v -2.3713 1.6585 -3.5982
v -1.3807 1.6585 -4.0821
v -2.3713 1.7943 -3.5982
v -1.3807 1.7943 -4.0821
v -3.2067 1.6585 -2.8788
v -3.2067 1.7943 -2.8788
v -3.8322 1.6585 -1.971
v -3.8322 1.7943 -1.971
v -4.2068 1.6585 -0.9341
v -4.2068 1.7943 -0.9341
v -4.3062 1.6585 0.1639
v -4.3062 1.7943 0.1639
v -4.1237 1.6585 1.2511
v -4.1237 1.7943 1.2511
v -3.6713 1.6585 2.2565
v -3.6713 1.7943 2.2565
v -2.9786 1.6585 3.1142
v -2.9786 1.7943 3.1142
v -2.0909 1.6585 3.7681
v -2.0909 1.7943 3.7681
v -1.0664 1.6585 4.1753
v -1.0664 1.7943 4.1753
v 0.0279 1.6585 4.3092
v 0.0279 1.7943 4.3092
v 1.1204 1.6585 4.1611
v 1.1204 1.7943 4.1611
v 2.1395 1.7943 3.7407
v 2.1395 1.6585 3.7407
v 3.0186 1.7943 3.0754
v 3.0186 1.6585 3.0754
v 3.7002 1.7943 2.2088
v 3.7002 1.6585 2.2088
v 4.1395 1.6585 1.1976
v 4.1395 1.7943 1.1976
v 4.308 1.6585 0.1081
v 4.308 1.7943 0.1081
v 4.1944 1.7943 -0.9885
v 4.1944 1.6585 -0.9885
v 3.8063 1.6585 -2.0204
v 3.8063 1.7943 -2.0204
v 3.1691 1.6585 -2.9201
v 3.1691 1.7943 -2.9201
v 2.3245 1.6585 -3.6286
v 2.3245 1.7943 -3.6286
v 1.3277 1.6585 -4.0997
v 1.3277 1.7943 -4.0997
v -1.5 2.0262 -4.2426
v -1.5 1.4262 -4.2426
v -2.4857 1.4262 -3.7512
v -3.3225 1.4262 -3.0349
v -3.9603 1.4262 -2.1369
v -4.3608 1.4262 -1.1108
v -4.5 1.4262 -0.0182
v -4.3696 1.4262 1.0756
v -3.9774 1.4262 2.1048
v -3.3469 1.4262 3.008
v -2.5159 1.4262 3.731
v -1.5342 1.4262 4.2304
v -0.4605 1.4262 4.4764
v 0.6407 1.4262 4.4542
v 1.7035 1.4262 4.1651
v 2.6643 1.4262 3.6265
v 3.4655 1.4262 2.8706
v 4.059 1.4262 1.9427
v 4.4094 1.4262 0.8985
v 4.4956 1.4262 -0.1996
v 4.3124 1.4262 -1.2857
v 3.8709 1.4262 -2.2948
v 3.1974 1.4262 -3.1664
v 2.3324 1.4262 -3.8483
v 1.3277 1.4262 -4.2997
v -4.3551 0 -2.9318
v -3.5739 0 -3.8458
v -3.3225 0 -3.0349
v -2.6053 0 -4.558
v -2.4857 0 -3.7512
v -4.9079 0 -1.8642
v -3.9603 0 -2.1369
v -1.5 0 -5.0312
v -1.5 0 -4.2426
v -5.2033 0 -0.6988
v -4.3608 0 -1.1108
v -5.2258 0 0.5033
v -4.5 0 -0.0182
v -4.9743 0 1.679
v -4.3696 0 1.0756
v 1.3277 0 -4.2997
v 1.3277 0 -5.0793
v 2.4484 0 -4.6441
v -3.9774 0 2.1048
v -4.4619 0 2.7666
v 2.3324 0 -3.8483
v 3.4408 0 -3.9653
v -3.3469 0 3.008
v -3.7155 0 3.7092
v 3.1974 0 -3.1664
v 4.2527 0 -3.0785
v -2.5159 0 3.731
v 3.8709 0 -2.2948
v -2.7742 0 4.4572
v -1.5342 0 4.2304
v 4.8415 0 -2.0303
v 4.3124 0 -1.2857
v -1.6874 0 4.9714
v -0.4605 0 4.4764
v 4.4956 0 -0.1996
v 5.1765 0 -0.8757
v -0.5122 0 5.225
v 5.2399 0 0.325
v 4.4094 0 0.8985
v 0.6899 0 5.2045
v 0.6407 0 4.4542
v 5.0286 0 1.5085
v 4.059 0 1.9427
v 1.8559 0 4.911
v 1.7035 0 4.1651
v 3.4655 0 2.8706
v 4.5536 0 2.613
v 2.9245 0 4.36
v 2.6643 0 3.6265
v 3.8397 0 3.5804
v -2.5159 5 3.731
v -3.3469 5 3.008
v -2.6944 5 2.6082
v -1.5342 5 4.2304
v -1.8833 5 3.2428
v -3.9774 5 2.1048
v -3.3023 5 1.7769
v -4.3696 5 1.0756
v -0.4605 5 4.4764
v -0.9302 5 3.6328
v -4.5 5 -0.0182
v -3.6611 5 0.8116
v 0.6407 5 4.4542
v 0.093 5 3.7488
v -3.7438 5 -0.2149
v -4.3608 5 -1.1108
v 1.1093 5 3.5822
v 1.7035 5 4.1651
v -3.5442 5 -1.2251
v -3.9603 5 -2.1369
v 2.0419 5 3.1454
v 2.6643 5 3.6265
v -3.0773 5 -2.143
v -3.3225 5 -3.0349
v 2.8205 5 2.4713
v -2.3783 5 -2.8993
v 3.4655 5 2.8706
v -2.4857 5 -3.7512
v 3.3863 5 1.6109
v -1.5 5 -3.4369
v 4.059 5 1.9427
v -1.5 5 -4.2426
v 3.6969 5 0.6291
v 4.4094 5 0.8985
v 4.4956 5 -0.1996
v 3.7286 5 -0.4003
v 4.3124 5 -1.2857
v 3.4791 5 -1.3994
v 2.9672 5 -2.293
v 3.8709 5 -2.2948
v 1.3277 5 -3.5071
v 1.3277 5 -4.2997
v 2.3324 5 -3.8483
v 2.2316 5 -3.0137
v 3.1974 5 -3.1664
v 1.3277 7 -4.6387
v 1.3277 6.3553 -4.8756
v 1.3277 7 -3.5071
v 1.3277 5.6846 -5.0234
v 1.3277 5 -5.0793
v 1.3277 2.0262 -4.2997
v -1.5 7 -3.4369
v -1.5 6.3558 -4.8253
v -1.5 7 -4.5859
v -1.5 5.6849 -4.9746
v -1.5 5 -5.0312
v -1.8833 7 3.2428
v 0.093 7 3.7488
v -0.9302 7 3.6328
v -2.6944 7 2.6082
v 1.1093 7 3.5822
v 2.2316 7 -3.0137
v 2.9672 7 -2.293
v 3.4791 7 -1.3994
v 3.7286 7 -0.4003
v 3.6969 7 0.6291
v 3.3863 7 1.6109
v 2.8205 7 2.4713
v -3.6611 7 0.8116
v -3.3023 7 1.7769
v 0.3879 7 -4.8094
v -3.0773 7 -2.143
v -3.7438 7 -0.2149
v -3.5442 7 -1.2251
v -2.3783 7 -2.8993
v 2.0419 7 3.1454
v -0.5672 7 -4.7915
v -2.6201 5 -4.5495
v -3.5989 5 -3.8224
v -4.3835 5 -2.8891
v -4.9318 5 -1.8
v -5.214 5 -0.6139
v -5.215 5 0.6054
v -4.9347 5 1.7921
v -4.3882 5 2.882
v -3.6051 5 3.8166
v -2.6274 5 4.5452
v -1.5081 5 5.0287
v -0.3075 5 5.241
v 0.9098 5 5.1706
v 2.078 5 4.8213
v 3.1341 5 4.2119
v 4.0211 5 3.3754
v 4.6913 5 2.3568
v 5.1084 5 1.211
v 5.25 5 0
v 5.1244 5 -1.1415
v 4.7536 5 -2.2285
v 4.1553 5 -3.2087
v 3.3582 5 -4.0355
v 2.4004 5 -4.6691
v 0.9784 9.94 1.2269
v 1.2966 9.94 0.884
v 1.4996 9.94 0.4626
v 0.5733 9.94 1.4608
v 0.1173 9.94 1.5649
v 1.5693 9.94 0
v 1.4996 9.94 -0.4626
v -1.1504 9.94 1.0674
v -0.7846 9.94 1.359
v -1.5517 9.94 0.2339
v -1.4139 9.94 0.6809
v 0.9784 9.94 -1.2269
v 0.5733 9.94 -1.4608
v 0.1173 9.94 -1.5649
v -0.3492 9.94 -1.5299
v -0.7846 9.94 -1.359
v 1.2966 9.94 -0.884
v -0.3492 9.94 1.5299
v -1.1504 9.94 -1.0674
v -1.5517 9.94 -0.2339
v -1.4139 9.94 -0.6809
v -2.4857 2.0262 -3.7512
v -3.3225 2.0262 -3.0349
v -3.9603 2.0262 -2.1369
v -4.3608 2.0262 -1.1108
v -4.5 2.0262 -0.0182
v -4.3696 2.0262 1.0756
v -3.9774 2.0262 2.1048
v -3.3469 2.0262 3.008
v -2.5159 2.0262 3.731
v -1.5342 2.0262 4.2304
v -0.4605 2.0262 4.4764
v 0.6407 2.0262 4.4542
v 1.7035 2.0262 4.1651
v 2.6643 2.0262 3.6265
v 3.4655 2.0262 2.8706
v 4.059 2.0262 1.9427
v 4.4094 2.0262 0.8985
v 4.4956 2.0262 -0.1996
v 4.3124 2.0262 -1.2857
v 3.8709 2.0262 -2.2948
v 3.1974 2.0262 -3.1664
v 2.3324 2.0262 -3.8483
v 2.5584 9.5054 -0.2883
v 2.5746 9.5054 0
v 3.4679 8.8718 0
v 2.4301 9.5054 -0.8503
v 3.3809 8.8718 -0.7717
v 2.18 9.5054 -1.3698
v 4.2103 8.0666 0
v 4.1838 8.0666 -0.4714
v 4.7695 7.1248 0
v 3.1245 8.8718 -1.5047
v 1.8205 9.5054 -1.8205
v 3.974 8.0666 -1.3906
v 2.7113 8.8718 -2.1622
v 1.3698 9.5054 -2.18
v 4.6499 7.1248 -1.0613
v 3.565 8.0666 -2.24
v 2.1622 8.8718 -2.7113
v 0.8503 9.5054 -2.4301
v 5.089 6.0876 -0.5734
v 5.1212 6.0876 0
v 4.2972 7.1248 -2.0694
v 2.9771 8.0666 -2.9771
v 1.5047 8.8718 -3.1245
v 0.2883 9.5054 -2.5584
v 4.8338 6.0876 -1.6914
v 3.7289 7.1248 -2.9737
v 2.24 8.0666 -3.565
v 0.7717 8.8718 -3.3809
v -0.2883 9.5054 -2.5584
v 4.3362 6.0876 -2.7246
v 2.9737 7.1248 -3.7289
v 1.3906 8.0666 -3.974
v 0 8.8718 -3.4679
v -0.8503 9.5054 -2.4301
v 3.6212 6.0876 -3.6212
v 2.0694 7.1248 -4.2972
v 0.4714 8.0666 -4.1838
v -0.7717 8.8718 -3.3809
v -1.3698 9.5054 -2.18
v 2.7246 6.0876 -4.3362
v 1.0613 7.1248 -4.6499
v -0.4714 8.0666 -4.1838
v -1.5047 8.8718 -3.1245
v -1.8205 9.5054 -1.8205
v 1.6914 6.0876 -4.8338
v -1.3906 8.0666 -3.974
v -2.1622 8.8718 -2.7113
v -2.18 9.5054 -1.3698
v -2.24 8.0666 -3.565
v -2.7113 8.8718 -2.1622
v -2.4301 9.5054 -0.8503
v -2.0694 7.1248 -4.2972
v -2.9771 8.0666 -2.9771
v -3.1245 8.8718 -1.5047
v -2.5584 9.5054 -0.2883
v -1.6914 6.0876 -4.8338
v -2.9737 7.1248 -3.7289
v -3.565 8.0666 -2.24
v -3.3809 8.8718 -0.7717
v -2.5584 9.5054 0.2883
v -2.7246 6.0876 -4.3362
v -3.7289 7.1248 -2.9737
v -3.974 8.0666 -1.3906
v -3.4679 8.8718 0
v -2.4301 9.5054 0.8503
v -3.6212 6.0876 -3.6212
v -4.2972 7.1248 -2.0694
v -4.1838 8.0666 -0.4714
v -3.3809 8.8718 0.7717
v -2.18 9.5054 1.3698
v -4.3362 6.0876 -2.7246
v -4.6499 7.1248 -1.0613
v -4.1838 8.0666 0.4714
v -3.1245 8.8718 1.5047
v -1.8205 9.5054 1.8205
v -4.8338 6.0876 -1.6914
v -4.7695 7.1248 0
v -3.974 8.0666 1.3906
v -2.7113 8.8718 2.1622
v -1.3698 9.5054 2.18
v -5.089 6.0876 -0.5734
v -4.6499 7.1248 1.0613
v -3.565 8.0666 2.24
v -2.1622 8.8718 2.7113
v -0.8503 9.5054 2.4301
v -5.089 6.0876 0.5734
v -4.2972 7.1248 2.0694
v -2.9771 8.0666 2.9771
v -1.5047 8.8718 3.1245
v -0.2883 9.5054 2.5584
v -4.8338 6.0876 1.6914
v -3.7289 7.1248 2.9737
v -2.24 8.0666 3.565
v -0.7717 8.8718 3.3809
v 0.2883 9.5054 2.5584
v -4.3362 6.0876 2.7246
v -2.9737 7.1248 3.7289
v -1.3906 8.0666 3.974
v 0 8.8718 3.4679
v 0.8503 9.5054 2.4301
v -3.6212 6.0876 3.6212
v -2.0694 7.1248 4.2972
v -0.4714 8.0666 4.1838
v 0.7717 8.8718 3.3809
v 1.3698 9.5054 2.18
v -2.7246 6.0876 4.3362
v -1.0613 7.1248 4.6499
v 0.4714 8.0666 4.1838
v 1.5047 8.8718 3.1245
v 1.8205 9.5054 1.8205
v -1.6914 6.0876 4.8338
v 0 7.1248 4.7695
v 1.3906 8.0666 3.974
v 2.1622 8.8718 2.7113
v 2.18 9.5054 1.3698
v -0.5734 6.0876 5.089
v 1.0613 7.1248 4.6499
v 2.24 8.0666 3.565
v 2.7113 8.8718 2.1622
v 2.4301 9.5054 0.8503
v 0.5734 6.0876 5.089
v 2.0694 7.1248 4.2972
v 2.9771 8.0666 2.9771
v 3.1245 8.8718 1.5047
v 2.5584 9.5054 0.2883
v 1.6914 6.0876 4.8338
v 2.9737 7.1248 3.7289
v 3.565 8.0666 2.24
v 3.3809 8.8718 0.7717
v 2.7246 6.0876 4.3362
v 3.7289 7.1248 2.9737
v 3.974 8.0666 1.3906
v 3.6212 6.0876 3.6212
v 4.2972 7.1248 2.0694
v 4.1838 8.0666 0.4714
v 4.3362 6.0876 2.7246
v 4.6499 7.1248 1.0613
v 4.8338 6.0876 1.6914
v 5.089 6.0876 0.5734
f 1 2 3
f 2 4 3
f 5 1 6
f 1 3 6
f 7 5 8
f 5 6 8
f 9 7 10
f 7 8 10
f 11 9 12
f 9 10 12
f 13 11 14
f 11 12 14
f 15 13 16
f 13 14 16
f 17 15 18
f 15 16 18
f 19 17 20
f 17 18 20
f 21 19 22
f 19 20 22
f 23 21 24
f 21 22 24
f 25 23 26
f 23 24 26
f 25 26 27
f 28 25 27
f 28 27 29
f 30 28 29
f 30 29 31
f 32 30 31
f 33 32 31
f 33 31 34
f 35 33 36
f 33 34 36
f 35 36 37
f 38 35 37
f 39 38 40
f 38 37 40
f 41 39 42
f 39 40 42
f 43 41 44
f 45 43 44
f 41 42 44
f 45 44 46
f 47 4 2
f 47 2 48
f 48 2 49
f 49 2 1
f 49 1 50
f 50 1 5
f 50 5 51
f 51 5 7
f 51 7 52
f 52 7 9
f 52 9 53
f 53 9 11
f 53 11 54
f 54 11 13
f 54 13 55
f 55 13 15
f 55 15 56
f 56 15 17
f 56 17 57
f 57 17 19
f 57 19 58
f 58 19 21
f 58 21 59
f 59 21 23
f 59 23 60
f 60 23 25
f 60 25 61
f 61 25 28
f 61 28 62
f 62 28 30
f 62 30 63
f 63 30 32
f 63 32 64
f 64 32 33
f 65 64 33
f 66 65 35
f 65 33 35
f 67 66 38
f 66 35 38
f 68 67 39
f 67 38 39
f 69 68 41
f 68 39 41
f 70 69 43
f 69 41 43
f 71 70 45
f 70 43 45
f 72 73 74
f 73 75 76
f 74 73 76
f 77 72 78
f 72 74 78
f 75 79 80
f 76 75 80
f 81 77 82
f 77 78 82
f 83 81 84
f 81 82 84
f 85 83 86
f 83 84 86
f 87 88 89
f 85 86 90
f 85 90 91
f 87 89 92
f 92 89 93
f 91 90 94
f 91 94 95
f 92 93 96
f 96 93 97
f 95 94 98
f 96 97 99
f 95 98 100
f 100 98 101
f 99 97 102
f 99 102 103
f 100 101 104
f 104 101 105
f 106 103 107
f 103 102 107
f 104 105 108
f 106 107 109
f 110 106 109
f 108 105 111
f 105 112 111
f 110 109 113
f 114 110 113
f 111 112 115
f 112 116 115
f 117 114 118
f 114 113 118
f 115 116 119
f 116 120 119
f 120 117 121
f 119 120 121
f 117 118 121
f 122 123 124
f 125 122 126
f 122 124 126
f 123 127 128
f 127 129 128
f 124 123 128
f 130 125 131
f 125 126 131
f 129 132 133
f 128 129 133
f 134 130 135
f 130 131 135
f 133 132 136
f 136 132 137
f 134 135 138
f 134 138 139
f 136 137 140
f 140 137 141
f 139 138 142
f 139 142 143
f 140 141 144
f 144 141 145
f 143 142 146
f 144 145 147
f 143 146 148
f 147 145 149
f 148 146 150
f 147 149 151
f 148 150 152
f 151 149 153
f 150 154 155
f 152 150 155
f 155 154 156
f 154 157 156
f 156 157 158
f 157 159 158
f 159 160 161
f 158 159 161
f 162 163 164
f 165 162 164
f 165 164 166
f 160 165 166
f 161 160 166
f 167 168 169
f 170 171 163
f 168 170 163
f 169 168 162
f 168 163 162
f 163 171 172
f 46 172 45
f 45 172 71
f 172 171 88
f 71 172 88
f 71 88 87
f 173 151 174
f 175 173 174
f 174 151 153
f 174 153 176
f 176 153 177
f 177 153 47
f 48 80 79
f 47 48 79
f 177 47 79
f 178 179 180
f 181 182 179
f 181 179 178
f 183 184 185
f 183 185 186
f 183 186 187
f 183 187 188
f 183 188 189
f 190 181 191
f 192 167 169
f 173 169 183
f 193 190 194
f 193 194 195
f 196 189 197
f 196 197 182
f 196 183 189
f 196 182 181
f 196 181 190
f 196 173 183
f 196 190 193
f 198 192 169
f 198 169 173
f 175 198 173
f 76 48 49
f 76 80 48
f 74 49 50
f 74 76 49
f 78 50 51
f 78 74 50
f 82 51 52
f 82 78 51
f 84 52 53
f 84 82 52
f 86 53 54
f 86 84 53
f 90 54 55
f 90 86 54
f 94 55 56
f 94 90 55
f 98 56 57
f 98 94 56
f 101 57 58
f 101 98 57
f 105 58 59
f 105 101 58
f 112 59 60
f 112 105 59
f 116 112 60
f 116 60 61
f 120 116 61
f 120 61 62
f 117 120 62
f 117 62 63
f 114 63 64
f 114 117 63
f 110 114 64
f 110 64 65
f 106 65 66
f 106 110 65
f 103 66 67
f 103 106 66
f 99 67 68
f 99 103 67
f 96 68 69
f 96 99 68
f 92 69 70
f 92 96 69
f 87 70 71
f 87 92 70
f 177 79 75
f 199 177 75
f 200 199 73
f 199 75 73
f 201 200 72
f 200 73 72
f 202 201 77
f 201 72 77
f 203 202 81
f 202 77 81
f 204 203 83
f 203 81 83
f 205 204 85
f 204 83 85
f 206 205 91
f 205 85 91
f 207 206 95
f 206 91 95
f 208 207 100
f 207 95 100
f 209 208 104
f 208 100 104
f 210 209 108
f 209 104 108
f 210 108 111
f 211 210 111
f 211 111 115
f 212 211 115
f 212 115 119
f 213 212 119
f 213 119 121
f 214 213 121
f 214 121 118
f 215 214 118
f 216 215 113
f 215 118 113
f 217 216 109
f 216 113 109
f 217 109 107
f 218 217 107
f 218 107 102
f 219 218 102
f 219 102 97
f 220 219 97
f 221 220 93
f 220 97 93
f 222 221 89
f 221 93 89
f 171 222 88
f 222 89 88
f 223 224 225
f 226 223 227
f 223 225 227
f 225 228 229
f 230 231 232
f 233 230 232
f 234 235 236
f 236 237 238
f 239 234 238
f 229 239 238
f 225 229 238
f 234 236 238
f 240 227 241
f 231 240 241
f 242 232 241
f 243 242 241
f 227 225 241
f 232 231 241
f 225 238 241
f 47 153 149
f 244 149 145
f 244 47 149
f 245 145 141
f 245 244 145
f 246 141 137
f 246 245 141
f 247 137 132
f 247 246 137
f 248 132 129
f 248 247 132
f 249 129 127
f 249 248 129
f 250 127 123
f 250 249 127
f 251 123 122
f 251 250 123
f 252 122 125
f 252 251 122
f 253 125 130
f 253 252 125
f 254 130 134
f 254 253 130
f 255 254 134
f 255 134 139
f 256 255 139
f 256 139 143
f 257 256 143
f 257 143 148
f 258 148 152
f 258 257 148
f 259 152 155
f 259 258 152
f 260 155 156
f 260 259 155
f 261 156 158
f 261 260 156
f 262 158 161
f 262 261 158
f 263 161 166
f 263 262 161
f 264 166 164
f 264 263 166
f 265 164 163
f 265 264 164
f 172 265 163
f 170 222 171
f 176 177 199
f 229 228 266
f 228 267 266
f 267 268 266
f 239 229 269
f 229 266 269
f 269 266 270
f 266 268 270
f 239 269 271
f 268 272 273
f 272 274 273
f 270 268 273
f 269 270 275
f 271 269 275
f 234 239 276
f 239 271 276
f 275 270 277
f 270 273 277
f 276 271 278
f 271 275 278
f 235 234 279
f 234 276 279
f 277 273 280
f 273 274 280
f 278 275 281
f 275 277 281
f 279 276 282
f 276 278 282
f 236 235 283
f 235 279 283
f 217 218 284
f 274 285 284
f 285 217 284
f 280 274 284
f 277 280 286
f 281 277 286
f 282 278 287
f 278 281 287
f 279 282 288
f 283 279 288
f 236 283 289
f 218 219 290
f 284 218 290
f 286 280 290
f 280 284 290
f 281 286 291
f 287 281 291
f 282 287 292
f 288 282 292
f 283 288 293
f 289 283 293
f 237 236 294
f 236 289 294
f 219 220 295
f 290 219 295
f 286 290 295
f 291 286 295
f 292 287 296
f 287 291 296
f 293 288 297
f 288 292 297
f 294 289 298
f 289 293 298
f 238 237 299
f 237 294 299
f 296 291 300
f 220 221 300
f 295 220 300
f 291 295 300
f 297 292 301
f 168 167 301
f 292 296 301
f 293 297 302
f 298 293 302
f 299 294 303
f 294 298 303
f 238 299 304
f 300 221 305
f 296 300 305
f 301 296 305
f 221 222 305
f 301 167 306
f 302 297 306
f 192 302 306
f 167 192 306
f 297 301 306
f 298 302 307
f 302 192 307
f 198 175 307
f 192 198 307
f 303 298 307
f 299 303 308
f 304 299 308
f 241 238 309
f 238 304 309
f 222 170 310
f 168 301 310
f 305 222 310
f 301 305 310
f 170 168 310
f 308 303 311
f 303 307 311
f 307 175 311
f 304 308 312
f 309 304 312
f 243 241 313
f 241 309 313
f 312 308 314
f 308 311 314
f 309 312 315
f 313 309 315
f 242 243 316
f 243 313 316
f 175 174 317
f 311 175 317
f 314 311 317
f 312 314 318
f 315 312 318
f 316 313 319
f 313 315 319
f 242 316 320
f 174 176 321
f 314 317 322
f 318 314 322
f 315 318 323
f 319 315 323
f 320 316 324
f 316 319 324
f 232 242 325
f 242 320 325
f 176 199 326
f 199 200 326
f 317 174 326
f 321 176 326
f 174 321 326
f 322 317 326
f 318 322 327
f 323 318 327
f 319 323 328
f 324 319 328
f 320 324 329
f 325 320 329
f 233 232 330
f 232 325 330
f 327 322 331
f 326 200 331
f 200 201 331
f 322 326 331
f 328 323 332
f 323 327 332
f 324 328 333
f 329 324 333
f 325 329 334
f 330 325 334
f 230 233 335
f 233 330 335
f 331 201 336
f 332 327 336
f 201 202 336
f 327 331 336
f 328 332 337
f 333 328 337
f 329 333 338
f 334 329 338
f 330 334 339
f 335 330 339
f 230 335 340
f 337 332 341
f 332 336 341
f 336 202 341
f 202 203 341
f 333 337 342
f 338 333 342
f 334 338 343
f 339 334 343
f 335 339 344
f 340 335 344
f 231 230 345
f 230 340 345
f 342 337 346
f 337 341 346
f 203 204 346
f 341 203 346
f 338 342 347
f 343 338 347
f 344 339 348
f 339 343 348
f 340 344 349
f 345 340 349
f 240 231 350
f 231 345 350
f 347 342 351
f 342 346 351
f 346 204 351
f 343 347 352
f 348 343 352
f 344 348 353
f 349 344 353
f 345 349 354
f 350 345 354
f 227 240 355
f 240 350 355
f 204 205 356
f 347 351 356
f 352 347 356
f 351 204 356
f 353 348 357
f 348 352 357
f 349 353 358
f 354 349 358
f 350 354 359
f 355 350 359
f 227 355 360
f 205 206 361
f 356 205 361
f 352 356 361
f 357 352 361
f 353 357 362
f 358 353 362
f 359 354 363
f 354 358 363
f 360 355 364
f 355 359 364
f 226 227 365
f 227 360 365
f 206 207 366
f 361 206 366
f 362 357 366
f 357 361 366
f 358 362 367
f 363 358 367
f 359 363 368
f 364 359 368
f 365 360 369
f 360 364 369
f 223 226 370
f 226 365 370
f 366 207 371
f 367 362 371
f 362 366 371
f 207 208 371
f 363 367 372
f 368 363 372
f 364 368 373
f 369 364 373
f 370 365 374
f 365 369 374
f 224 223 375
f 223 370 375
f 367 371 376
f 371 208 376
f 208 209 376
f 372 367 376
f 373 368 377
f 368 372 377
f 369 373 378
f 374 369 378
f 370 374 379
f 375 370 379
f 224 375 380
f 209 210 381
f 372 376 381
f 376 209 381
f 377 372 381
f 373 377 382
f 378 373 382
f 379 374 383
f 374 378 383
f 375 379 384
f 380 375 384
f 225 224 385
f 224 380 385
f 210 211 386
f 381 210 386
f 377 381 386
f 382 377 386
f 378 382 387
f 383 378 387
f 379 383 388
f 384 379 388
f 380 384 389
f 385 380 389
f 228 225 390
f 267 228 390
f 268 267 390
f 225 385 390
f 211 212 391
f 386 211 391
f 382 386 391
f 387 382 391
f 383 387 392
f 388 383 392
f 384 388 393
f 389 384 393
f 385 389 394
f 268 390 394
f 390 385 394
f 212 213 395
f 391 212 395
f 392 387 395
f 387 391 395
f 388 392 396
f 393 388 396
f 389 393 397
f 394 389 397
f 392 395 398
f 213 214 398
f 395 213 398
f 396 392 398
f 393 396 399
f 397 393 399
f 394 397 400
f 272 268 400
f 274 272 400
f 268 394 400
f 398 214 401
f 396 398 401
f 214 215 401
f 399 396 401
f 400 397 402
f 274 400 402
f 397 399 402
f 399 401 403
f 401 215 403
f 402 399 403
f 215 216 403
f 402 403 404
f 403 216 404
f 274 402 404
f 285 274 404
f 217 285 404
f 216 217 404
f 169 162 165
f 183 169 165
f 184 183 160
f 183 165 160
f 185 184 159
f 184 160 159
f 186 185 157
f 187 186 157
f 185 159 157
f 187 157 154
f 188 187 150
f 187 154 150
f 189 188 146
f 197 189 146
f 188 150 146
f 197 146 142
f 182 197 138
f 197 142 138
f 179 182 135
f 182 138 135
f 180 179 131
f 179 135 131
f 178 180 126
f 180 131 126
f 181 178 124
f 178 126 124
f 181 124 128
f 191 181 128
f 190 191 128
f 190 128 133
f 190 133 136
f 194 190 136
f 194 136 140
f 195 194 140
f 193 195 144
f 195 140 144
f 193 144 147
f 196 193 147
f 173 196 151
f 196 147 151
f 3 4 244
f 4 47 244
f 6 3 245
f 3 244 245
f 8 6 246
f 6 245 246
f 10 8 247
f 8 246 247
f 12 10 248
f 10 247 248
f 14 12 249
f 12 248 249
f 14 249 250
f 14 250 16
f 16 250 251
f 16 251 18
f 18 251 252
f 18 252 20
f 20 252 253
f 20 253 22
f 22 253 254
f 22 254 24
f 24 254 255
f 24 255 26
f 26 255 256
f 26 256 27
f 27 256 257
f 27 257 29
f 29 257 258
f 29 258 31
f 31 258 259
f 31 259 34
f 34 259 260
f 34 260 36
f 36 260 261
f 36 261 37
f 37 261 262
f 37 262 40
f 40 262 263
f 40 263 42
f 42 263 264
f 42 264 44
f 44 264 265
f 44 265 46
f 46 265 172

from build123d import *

# Parameters (mm, degrees)
SKETCH1_R           = 5.25
SKETCH1_R_2         = 4.5
BOSS_EXTRUDE1_DEPTH = 5
CUT_EXTRUDE1_DEPTH  = 5
CUT_EXTRUDE2_DEPTH  = 2
SKETCH6_R           = 2
CUT_EXTRUDE4_DEPTH  = 0.35


with BuildPart() as part:
    # Sketch1 → Boss-Extrude1 (new body)
    with BuildSketch(Plane(origin=(0, 0, 0), x_dir=(1, 0, 0), z_dir=(0, 1, 0))):
        with Locations(Location((0, 0, 0), (0, 0, 270))):
            Circle(SKETCH1_R)
        with Locations(Location((0, 0, 0), (0, 0, 270))):
            Circle(SKETCH1_R_2, mode=Mode.SUBTRACT)
    extrude(amount=BOSS_EXTRUDE1_DEPTH)

    # Sketch2 → Cut-Extrude1 (cut)
    with BuildSketch(Plane(origin=(0, 0, 0), x_dir=(1, 0, 0), z_dir=(0, 1, 0))):
        Polygon((1.327689147, 3.795637322), (1.327689147, 5.701107087), (-1.5, 5.701107087), (-1.5, 3.701107087), align=None)
    extrude(amount=CUT_EXTRUDE1_DEPTH, mode=Mode.SUBTRACT)

    # Sketch4 → Revolve1 (revolve)
    with BuildSketch(Plane.XY):
        with BuildLine():
            Line((5.25, 5), (0, 5))
            Line((0, 5), (0, 10.18))
            ThreePointArc((0, 10.18), (3.687644912, 8.667004979), (5.25, 5))
        make_face()
    revolve(axis=Axis((0, 5, 0), (0, 1, 0)))

    # Sketch5 → Cut-Extrude2 (cut)
    with BuildSketch(Plane(origin=(0, 5, 0), x_dir=(-1, 0, 0), z_dir=(0, -1, 0))):
        with BuildLine():
            Line((1.5, 3.436931771), (1.5, 6))
            Line((1.5, 6), (-1.327689147, 6))
            Line((-1.327689147, 6), (-1.327689147, 3.507098734))
            ThreePointArc((-1.327689147, 3.507098734), (-0.093024772, -3.748846008), (1.5, 3.436931771))
        make_face()
    extrude(amount=-CUT_EXTRUDE2_DEPTH, mode=Mode.SUBTRACT)

    # Sketch6 → Cut-Extrude4 (cut)
    with BuildSketch(Plane(origin=(0, 10.29, 0), x_dir=(-1, 0, 0), z_dir=(0, -1, 0))):
        Circle(SKETCH6_R)
    extrude(amount=CUT_EXTRUDE4_DEPTH, mode=Mode.SUBTRACT)

    # Sweep1: sweep along a path in Sketch9
    with BuildLine(Plane(origin=(0, 1.5, 0), x_dir=(-1, 0, 0), z_dir=(0, -1, 0))) as sweep1_path:
        ThreePointArc((1.5, 4.242640687), (-0.090752997, -4.499084784), (-1.327689147, 4.299679236))
    # Friction Bump → Sweep1 (sweep)
    with BuildSketch(Plane.ZY.offset(-1.327689147)):
        Polygon((-4.299679236, 2.026185405), (-4.299679236, 1.426185405), (-4.099679236, 1.658472971), (-4.099679236, 1.7942723), align=None)
    sweep(path=sweep1_path.line)


solid = part.part
